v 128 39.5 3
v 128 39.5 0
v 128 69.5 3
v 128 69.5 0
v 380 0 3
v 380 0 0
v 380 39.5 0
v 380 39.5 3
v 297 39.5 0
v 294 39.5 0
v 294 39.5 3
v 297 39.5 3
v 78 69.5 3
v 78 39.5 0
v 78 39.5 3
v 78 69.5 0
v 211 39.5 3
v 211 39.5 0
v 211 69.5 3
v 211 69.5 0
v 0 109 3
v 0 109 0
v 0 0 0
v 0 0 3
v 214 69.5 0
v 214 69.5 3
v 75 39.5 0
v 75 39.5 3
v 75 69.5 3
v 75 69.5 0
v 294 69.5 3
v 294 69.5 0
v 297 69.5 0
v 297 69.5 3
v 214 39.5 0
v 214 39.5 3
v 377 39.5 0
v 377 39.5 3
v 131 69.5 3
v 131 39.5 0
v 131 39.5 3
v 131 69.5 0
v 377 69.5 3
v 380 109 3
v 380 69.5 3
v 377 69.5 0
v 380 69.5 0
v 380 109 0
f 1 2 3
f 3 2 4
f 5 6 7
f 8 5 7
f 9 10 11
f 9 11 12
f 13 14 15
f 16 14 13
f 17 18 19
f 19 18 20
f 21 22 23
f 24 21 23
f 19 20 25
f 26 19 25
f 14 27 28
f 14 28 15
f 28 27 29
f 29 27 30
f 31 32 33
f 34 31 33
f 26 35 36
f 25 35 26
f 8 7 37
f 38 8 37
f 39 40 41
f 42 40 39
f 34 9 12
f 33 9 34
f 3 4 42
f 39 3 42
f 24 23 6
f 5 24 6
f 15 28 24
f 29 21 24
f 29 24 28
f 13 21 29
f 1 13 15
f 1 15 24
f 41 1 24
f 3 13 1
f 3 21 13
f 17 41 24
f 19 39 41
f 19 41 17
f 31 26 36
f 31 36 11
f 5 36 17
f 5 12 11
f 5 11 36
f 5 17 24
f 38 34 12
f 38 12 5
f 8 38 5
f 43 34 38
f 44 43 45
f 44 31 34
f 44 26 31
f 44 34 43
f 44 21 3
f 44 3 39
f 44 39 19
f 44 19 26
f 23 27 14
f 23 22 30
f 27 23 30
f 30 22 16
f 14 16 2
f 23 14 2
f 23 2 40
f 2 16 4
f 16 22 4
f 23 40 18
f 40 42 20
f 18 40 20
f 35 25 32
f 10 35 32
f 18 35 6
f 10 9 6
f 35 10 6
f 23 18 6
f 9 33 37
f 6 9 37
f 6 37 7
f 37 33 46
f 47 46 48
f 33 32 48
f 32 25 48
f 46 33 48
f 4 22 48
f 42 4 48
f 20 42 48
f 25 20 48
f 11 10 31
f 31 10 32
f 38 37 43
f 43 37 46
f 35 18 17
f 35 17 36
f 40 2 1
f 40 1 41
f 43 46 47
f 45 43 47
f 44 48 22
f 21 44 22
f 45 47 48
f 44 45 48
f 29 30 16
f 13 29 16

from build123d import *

# Parameters (mm, degrees)
SKETCH1_W           = 3
SKETCH1_H           = 30
BOSS_EXTRUDE1_DEPTH = 3


with BuildPart() as part:
    # Sketch1 → Boss-Extrude1 (new body)
    with BuildSketch(Plane.XY):
        Polygon((380, 109), (115, 109), (0, 109), (0, 0), (380, 0), (380, 39.5), (377, 39.5), (377, 69.5), (380, 69.5), align=None)
        with Locations((76.5, 54.5)):
            Rectangle(SKETCH1_W, SKETCH1_H, mode=Mode.SUBTRACT)
        with Locations((129.5, 54.5)):
            Rectangle(SKETCH1_W, SKETCH1_H, mode=Mode.SUBTRACT)
        with Locations((212.5, 54.5)):
            Rectangle(SKETCH1_W, SKETCH1_H, mode=Mode.SUBTRACT)
        with Locations((295.5, 54.5)):
            Rectangle(SKETCH1_W, SKETCH1_H, mode=Mode.SUBTRACT)
    extrude(amount=BOSS_EXTRUDE1_DEPTH)


solid = part.part
